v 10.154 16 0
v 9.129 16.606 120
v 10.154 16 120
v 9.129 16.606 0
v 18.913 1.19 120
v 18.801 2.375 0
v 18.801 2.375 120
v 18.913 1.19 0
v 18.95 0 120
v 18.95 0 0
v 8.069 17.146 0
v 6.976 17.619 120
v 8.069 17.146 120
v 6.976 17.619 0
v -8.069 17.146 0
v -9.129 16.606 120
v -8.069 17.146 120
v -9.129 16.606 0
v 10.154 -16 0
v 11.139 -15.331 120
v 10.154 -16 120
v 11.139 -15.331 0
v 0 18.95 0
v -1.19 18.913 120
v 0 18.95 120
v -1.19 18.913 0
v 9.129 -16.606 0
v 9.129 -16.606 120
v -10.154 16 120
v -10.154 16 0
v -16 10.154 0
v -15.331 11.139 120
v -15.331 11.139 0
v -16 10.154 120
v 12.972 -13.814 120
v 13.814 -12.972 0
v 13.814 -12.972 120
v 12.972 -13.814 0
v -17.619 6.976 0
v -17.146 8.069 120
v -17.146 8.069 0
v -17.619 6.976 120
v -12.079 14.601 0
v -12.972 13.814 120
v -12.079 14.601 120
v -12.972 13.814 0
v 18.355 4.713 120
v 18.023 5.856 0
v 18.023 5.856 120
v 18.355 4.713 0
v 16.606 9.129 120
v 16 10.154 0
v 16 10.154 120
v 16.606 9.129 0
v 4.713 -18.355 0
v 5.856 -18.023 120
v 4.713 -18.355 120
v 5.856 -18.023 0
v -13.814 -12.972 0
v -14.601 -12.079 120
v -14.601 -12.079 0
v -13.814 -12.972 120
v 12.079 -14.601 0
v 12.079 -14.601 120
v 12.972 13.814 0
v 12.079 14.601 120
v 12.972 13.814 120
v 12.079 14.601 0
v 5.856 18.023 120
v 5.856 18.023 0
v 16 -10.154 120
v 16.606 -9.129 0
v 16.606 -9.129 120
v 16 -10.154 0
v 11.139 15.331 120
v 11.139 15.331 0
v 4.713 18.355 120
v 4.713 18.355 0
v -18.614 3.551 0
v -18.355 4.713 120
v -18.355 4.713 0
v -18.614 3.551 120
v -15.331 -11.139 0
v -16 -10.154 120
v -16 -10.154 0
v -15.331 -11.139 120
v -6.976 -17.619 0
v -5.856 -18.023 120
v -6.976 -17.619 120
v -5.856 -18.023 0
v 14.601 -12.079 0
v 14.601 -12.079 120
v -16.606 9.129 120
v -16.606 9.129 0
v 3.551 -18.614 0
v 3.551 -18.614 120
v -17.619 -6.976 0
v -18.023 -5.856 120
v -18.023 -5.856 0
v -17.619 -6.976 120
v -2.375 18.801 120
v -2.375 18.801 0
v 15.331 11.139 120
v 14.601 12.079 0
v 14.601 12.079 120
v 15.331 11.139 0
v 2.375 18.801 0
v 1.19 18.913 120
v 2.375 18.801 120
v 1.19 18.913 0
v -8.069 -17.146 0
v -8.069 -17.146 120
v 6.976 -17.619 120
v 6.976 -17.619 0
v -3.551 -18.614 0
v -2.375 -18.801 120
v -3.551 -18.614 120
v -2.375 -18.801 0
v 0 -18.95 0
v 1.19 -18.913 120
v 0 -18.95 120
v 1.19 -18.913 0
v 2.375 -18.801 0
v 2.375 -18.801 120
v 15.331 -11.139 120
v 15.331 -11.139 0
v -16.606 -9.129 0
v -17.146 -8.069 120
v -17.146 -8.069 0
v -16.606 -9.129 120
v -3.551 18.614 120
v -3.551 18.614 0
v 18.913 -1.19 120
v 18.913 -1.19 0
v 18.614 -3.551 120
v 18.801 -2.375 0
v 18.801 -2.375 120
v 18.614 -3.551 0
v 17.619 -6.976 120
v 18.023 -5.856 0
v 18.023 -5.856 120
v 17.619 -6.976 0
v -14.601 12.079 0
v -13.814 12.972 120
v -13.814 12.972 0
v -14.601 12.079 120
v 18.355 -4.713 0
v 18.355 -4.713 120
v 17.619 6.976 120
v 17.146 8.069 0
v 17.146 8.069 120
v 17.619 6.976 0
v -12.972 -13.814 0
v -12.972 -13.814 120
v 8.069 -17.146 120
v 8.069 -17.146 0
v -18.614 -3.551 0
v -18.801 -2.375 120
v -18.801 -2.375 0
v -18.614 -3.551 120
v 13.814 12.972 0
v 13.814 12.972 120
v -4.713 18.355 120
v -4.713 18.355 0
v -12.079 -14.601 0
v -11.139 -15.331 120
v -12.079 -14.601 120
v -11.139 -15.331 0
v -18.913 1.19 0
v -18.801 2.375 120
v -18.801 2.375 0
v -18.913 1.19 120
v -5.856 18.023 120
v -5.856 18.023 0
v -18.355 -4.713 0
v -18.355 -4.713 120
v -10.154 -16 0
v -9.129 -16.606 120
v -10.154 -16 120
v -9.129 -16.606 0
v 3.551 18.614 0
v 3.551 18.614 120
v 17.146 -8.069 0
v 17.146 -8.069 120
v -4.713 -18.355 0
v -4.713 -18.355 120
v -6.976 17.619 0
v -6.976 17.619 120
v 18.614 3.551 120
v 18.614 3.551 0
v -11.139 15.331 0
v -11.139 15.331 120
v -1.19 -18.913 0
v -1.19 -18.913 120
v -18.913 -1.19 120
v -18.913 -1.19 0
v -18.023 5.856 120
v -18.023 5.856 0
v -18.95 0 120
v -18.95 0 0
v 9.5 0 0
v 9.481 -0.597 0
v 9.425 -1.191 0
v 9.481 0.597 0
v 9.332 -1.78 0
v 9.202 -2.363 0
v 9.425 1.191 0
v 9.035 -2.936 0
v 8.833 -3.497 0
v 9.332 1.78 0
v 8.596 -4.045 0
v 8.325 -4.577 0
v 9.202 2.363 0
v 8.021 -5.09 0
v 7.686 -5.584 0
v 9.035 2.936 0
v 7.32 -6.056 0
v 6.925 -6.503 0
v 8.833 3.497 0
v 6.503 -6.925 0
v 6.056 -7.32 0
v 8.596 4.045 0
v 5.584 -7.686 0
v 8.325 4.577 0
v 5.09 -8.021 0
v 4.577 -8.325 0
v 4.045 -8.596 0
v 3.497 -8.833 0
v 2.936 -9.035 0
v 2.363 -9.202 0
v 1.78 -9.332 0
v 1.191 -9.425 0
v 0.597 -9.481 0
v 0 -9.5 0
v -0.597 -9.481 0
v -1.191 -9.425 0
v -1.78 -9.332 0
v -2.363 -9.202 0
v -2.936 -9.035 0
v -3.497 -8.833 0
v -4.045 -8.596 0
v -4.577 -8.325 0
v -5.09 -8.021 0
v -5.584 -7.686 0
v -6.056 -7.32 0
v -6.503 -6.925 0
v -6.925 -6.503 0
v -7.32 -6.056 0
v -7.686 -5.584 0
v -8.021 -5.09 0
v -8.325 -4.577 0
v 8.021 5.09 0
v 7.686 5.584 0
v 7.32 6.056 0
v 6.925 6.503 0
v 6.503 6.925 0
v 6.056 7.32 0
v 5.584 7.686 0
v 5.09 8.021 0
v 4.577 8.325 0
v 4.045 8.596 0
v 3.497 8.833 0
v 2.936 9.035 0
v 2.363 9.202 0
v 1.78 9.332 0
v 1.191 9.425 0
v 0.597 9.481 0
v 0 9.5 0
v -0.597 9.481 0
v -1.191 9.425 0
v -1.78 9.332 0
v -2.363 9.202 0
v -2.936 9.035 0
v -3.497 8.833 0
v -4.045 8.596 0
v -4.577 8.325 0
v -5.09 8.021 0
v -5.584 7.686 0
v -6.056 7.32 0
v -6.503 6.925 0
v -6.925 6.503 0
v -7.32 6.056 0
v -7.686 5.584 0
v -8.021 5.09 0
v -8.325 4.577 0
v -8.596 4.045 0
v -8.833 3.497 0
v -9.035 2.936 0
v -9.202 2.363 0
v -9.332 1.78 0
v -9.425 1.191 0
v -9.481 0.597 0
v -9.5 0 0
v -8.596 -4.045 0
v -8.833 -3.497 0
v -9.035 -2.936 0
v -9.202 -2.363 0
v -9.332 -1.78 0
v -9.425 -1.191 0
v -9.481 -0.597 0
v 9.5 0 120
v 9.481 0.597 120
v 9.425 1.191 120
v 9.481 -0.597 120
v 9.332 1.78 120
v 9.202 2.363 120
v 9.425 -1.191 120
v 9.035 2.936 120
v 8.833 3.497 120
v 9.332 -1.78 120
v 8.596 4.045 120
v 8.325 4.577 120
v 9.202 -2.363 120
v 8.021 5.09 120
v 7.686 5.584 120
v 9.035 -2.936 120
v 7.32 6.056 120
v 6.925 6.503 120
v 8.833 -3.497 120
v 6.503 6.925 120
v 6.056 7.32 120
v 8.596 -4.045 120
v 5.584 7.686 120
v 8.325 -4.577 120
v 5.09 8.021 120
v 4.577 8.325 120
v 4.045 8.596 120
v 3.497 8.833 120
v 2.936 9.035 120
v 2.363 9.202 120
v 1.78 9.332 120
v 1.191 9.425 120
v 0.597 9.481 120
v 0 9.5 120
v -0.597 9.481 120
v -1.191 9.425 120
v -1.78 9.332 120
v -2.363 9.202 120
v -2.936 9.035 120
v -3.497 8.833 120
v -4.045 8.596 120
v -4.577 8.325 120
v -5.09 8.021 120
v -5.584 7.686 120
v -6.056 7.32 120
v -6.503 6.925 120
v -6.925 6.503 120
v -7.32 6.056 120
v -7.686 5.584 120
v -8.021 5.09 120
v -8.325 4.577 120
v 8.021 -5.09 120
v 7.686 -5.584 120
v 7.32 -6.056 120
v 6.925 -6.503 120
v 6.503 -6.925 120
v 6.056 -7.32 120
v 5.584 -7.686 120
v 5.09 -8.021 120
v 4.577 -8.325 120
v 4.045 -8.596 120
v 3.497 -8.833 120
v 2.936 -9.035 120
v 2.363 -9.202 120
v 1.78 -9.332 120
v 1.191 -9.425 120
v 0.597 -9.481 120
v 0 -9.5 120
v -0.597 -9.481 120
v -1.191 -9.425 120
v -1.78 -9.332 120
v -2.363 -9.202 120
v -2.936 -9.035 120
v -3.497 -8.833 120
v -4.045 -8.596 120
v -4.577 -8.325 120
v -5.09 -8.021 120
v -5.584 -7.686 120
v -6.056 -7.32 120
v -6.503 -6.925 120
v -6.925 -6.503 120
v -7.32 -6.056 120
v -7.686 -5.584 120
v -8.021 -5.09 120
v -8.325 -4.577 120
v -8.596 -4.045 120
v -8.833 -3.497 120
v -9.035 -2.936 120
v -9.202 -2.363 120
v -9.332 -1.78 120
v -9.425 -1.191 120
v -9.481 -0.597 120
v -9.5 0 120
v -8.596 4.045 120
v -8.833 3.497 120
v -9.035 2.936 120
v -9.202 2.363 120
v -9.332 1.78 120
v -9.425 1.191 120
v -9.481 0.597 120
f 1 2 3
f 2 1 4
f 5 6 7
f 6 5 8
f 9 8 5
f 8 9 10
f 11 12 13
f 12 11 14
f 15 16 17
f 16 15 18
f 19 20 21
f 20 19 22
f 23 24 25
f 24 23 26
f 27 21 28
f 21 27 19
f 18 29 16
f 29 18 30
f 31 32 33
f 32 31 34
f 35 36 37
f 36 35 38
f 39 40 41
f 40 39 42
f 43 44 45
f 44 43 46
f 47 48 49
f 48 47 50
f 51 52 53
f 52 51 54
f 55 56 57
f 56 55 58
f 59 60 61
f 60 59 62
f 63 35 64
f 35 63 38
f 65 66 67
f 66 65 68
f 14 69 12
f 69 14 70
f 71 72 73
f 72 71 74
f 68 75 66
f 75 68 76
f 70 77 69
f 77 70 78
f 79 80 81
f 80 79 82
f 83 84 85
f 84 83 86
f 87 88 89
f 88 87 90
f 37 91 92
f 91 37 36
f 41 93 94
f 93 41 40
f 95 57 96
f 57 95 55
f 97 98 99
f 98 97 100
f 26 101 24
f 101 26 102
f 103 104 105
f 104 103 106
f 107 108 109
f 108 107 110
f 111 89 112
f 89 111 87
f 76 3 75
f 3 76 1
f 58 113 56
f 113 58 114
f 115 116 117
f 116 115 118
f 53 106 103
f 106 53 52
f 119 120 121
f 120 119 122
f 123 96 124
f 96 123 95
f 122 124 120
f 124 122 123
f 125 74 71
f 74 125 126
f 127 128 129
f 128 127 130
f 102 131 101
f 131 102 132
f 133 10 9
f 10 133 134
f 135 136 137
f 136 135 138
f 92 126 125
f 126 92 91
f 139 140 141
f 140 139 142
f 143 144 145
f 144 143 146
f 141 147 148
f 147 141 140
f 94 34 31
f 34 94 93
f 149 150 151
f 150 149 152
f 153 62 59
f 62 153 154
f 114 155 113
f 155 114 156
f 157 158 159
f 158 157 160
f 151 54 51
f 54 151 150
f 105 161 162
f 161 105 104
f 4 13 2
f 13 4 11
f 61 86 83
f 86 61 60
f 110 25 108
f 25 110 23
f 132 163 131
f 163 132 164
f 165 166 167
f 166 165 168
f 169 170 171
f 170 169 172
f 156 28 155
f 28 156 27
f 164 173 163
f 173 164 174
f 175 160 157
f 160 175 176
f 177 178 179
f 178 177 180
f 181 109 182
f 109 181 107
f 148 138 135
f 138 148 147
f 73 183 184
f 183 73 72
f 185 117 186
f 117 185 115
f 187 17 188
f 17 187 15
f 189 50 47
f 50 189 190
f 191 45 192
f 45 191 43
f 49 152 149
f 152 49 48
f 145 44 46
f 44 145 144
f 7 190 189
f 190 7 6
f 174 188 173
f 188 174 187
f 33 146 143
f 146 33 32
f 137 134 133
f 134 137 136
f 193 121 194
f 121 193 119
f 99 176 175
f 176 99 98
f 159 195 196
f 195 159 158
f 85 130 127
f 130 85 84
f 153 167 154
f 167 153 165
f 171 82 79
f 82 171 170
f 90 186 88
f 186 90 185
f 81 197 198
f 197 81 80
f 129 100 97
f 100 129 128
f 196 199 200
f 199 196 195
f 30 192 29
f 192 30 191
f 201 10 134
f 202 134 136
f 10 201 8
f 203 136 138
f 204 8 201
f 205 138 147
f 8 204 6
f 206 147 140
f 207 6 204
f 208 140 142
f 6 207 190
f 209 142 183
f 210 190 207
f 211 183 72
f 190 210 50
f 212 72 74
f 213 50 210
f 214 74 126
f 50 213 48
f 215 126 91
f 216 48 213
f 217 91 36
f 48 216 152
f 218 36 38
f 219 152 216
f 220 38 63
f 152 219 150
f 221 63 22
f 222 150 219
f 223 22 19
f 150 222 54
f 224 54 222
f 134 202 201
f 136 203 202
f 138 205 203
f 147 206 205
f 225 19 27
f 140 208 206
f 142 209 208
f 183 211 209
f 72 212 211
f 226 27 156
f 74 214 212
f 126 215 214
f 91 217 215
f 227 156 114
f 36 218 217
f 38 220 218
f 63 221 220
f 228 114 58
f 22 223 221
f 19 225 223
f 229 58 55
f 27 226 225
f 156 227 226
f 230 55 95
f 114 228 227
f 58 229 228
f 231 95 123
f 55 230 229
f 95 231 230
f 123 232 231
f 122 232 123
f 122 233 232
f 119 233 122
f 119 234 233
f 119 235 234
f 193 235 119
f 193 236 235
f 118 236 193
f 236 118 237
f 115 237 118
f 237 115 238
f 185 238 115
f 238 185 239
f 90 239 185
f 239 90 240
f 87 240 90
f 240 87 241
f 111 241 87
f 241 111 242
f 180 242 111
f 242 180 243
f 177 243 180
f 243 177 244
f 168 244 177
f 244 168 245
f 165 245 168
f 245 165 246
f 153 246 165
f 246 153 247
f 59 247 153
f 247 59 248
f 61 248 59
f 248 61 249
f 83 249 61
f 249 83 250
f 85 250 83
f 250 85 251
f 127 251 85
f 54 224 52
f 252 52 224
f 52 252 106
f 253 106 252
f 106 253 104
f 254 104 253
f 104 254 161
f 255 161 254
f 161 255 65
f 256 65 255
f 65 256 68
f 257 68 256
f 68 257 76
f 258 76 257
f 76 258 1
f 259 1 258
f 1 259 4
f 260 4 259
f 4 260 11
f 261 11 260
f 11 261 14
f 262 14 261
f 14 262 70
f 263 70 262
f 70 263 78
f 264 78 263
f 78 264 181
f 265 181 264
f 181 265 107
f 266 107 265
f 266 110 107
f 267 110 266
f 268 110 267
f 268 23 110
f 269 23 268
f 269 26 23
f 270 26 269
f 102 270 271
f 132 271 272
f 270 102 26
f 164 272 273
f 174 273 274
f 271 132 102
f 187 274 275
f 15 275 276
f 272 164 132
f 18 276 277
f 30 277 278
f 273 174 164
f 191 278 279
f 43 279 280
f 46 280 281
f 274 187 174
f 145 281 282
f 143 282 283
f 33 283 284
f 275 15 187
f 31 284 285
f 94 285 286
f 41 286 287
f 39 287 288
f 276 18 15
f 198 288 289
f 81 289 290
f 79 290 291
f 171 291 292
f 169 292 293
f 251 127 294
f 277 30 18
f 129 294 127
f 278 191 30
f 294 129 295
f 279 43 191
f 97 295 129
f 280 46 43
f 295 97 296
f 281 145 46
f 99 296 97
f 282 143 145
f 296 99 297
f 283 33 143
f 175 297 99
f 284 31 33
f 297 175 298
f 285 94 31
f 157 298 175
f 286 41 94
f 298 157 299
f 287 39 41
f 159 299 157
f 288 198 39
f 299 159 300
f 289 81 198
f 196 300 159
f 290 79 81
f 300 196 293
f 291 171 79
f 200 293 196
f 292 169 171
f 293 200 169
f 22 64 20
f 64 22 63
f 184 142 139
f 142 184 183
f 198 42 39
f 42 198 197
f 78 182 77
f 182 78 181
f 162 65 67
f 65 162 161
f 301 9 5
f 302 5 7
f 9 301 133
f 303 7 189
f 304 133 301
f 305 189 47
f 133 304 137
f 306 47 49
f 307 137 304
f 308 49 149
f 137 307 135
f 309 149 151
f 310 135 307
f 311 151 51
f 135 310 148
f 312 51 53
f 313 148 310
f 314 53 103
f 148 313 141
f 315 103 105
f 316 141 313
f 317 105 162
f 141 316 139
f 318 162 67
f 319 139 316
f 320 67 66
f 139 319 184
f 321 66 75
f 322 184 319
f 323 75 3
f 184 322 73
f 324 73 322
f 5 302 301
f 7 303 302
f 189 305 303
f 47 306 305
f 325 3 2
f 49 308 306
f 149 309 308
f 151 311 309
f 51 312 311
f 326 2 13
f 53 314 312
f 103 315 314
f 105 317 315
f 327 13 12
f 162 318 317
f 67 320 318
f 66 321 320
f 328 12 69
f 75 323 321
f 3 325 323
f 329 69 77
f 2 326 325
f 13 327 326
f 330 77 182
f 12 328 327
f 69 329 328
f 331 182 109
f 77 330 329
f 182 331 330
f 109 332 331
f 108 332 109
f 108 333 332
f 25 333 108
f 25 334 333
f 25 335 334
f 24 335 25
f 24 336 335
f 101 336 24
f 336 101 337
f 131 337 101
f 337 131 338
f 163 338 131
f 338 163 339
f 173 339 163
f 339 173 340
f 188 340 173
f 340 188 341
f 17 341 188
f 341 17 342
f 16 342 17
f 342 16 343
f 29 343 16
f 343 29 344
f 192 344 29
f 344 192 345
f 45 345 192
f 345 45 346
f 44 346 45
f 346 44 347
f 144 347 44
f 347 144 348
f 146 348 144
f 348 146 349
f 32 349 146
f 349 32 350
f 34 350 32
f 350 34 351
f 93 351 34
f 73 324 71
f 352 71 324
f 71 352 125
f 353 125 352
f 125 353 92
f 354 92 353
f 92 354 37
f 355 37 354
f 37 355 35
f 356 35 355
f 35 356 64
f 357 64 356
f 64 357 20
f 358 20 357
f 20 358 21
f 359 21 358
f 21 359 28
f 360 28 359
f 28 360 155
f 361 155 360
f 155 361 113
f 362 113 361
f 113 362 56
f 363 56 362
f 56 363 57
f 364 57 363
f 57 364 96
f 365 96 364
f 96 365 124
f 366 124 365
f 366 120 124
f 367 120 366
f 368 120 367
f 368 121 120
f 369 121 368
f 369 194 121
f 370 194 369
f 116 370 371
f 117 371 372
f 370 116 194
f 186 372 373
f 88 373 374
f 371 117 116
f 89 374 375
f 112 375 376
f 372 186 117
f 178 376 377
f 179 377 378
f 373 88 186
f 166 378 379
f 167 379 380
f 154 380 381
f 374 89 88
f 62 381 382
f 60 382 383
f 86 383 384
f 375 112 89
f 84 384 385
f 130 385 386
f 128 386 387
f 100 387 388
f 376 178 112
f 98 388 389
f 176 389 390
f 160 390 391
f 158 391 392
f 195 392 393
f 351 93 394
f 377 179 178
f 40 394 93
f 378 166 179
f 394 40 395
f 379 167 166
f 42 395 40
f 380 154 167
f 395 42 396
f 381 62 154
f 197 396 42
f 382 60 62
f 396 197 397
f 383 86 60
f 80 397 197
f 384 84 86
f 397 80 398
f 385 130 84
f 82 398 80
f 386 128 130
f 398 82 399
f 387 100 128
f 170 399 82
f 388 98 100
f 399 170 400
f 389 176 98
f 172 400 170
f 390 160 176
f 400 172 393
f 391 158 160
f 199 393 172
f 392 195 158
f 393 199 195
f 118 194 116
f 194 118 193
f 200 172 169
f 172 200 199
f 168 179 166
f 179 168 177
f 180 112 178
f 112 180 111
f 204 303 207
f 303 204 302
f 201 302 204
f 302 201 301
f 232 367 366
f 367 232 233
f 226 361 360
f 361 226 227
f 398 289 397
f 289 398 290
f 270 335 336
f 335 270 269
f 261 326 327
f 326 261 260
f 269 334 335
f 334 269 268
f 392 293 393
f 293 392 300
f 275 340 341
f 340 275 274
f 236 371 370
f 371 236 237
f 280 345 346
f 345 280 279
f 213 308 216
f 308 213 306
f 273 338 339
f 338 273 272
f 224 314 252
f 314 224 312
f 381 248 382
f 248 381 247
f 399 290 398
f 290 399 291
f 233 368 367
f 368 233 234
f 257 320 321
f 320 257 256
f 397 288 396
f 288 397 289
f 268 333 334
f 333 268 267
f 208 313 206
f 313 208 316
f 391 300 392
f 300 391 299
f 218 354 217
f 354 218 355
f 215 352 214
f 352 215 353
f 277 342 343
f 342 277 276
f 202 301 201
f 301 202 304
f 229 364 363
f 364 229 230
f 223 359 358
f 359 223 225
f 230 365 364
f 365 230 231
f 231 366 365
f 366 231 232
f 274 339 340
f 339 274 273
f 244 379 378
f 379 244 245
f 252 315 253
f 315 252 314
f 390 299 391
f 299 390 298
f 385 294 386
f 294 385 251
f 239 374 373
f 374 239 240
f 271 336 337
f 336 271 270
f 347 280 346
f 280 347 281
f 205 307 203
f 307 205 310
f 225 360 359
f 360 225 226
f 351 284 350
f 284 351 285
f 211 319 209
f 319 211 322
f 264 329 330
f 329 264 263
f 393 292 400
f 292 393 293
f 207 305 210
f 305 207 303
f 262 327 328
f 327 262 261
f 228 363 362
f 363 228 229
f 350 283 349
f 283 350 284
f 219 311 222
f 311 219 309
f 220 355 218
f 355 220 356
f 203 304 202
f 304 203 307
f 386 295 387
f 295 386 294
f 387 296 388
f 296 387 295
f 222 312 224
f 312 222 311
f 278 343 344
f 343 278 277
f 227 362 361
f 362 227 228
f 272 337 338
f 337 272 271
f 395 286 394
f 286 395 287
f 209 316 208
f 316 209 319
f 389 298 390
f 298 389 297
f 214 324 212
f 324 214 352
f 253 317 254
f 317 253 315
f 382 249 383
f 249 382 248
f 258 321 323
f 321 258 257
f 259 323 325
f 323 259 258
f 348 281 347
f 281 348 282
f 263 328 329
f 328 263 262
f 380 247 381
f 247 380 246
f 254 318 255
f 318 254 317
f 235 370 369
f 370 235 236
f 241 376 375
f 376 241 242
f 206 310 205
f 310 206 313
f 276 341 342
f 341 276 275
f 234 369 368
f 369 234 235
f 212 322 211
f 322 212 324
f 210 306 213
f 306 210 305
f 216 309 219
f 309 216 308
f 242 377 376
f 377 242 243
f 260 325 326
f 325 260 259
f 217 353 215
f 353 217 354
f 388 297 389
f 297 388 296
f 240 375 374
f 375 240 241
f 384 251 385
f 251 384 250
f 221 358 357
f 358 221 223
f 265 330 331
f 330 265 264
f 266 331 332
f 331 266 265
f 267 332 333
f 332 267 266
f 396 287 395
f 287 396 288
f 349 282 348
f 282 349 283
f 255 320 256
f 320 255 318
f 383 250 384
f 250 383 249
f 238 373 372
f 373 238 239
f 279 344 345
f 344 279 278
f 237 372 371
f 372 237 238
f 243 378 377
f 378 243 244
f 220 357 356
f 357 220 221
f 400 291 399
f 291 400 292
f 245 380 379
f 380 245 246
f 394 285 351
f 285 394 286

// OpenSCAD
/* Cylinder with a hole

To slide onto a horizontal bar of a retort stand (aka "chemistry"
stand) so that the filament roll will turn more easily.  You also can
use this to augment various filament holders and stands made from
filament.

Made by Daniel K. Schneider, TECFA, University of Geneva, August 2012, revised Feb 2016
Licence: Freeware

A hollow cylinder is defined by 5 parameters. It's length, the
diameter of the hole, the outside diameter, extra space added to the
hole diameter and extraspace substracted from the outer diameter.

Measure the diameter of the bar (typically 12mm for a retort stand)
and of the holes of your filament rools.  Use these measures as such,
but you can ajust "extraspace_diameter = 0.25;" and "extra_space" inner.

Adapt parameters if needed.

Hole diameter is 1.2 for a typical retort stand

Filament roll hole diameters seem to vary from 19 to 74 mm. Frequent
ones are 31mm, 39mm and 52mm. Outersize diameter ranges from 12.5cm
(e.g. Taulman T-glase) to 30cm. Typical outer width (length of the
cylinder to print) is from 6cm to 12.5cm. Below the ones that I
printed.

// cylinder_diameter = 31.6; // 
// cylinder_diameter = 38.3; // 
// cylinder_diameter = 50.9; // 

Adjust the length. Add extraspace, e.g. 4cm.

*/


// Diameter of the hole 
hole_diameter = 17; // 

// Extra inner space added to hole diameter
extraspace_hole = 1;

// Diameter of the cylinder (hole of filament roll)
cylinder_diameter = 38.3;

// Outer extra space subtracted from diameter
extraspace_diameter = 0.2;

// Cylinder length
length = 120;


translate ([0,0,length/2]) {
  difference() {
    cylinder (h = length, r=cylinder_diameter / 2 - extraspace_diameter, center = true, $fn=100);
    # cylinder (h = length+2, r=hole_diameter / 2 + extraspace_hole, center = true, $fn=100);
  }
}
